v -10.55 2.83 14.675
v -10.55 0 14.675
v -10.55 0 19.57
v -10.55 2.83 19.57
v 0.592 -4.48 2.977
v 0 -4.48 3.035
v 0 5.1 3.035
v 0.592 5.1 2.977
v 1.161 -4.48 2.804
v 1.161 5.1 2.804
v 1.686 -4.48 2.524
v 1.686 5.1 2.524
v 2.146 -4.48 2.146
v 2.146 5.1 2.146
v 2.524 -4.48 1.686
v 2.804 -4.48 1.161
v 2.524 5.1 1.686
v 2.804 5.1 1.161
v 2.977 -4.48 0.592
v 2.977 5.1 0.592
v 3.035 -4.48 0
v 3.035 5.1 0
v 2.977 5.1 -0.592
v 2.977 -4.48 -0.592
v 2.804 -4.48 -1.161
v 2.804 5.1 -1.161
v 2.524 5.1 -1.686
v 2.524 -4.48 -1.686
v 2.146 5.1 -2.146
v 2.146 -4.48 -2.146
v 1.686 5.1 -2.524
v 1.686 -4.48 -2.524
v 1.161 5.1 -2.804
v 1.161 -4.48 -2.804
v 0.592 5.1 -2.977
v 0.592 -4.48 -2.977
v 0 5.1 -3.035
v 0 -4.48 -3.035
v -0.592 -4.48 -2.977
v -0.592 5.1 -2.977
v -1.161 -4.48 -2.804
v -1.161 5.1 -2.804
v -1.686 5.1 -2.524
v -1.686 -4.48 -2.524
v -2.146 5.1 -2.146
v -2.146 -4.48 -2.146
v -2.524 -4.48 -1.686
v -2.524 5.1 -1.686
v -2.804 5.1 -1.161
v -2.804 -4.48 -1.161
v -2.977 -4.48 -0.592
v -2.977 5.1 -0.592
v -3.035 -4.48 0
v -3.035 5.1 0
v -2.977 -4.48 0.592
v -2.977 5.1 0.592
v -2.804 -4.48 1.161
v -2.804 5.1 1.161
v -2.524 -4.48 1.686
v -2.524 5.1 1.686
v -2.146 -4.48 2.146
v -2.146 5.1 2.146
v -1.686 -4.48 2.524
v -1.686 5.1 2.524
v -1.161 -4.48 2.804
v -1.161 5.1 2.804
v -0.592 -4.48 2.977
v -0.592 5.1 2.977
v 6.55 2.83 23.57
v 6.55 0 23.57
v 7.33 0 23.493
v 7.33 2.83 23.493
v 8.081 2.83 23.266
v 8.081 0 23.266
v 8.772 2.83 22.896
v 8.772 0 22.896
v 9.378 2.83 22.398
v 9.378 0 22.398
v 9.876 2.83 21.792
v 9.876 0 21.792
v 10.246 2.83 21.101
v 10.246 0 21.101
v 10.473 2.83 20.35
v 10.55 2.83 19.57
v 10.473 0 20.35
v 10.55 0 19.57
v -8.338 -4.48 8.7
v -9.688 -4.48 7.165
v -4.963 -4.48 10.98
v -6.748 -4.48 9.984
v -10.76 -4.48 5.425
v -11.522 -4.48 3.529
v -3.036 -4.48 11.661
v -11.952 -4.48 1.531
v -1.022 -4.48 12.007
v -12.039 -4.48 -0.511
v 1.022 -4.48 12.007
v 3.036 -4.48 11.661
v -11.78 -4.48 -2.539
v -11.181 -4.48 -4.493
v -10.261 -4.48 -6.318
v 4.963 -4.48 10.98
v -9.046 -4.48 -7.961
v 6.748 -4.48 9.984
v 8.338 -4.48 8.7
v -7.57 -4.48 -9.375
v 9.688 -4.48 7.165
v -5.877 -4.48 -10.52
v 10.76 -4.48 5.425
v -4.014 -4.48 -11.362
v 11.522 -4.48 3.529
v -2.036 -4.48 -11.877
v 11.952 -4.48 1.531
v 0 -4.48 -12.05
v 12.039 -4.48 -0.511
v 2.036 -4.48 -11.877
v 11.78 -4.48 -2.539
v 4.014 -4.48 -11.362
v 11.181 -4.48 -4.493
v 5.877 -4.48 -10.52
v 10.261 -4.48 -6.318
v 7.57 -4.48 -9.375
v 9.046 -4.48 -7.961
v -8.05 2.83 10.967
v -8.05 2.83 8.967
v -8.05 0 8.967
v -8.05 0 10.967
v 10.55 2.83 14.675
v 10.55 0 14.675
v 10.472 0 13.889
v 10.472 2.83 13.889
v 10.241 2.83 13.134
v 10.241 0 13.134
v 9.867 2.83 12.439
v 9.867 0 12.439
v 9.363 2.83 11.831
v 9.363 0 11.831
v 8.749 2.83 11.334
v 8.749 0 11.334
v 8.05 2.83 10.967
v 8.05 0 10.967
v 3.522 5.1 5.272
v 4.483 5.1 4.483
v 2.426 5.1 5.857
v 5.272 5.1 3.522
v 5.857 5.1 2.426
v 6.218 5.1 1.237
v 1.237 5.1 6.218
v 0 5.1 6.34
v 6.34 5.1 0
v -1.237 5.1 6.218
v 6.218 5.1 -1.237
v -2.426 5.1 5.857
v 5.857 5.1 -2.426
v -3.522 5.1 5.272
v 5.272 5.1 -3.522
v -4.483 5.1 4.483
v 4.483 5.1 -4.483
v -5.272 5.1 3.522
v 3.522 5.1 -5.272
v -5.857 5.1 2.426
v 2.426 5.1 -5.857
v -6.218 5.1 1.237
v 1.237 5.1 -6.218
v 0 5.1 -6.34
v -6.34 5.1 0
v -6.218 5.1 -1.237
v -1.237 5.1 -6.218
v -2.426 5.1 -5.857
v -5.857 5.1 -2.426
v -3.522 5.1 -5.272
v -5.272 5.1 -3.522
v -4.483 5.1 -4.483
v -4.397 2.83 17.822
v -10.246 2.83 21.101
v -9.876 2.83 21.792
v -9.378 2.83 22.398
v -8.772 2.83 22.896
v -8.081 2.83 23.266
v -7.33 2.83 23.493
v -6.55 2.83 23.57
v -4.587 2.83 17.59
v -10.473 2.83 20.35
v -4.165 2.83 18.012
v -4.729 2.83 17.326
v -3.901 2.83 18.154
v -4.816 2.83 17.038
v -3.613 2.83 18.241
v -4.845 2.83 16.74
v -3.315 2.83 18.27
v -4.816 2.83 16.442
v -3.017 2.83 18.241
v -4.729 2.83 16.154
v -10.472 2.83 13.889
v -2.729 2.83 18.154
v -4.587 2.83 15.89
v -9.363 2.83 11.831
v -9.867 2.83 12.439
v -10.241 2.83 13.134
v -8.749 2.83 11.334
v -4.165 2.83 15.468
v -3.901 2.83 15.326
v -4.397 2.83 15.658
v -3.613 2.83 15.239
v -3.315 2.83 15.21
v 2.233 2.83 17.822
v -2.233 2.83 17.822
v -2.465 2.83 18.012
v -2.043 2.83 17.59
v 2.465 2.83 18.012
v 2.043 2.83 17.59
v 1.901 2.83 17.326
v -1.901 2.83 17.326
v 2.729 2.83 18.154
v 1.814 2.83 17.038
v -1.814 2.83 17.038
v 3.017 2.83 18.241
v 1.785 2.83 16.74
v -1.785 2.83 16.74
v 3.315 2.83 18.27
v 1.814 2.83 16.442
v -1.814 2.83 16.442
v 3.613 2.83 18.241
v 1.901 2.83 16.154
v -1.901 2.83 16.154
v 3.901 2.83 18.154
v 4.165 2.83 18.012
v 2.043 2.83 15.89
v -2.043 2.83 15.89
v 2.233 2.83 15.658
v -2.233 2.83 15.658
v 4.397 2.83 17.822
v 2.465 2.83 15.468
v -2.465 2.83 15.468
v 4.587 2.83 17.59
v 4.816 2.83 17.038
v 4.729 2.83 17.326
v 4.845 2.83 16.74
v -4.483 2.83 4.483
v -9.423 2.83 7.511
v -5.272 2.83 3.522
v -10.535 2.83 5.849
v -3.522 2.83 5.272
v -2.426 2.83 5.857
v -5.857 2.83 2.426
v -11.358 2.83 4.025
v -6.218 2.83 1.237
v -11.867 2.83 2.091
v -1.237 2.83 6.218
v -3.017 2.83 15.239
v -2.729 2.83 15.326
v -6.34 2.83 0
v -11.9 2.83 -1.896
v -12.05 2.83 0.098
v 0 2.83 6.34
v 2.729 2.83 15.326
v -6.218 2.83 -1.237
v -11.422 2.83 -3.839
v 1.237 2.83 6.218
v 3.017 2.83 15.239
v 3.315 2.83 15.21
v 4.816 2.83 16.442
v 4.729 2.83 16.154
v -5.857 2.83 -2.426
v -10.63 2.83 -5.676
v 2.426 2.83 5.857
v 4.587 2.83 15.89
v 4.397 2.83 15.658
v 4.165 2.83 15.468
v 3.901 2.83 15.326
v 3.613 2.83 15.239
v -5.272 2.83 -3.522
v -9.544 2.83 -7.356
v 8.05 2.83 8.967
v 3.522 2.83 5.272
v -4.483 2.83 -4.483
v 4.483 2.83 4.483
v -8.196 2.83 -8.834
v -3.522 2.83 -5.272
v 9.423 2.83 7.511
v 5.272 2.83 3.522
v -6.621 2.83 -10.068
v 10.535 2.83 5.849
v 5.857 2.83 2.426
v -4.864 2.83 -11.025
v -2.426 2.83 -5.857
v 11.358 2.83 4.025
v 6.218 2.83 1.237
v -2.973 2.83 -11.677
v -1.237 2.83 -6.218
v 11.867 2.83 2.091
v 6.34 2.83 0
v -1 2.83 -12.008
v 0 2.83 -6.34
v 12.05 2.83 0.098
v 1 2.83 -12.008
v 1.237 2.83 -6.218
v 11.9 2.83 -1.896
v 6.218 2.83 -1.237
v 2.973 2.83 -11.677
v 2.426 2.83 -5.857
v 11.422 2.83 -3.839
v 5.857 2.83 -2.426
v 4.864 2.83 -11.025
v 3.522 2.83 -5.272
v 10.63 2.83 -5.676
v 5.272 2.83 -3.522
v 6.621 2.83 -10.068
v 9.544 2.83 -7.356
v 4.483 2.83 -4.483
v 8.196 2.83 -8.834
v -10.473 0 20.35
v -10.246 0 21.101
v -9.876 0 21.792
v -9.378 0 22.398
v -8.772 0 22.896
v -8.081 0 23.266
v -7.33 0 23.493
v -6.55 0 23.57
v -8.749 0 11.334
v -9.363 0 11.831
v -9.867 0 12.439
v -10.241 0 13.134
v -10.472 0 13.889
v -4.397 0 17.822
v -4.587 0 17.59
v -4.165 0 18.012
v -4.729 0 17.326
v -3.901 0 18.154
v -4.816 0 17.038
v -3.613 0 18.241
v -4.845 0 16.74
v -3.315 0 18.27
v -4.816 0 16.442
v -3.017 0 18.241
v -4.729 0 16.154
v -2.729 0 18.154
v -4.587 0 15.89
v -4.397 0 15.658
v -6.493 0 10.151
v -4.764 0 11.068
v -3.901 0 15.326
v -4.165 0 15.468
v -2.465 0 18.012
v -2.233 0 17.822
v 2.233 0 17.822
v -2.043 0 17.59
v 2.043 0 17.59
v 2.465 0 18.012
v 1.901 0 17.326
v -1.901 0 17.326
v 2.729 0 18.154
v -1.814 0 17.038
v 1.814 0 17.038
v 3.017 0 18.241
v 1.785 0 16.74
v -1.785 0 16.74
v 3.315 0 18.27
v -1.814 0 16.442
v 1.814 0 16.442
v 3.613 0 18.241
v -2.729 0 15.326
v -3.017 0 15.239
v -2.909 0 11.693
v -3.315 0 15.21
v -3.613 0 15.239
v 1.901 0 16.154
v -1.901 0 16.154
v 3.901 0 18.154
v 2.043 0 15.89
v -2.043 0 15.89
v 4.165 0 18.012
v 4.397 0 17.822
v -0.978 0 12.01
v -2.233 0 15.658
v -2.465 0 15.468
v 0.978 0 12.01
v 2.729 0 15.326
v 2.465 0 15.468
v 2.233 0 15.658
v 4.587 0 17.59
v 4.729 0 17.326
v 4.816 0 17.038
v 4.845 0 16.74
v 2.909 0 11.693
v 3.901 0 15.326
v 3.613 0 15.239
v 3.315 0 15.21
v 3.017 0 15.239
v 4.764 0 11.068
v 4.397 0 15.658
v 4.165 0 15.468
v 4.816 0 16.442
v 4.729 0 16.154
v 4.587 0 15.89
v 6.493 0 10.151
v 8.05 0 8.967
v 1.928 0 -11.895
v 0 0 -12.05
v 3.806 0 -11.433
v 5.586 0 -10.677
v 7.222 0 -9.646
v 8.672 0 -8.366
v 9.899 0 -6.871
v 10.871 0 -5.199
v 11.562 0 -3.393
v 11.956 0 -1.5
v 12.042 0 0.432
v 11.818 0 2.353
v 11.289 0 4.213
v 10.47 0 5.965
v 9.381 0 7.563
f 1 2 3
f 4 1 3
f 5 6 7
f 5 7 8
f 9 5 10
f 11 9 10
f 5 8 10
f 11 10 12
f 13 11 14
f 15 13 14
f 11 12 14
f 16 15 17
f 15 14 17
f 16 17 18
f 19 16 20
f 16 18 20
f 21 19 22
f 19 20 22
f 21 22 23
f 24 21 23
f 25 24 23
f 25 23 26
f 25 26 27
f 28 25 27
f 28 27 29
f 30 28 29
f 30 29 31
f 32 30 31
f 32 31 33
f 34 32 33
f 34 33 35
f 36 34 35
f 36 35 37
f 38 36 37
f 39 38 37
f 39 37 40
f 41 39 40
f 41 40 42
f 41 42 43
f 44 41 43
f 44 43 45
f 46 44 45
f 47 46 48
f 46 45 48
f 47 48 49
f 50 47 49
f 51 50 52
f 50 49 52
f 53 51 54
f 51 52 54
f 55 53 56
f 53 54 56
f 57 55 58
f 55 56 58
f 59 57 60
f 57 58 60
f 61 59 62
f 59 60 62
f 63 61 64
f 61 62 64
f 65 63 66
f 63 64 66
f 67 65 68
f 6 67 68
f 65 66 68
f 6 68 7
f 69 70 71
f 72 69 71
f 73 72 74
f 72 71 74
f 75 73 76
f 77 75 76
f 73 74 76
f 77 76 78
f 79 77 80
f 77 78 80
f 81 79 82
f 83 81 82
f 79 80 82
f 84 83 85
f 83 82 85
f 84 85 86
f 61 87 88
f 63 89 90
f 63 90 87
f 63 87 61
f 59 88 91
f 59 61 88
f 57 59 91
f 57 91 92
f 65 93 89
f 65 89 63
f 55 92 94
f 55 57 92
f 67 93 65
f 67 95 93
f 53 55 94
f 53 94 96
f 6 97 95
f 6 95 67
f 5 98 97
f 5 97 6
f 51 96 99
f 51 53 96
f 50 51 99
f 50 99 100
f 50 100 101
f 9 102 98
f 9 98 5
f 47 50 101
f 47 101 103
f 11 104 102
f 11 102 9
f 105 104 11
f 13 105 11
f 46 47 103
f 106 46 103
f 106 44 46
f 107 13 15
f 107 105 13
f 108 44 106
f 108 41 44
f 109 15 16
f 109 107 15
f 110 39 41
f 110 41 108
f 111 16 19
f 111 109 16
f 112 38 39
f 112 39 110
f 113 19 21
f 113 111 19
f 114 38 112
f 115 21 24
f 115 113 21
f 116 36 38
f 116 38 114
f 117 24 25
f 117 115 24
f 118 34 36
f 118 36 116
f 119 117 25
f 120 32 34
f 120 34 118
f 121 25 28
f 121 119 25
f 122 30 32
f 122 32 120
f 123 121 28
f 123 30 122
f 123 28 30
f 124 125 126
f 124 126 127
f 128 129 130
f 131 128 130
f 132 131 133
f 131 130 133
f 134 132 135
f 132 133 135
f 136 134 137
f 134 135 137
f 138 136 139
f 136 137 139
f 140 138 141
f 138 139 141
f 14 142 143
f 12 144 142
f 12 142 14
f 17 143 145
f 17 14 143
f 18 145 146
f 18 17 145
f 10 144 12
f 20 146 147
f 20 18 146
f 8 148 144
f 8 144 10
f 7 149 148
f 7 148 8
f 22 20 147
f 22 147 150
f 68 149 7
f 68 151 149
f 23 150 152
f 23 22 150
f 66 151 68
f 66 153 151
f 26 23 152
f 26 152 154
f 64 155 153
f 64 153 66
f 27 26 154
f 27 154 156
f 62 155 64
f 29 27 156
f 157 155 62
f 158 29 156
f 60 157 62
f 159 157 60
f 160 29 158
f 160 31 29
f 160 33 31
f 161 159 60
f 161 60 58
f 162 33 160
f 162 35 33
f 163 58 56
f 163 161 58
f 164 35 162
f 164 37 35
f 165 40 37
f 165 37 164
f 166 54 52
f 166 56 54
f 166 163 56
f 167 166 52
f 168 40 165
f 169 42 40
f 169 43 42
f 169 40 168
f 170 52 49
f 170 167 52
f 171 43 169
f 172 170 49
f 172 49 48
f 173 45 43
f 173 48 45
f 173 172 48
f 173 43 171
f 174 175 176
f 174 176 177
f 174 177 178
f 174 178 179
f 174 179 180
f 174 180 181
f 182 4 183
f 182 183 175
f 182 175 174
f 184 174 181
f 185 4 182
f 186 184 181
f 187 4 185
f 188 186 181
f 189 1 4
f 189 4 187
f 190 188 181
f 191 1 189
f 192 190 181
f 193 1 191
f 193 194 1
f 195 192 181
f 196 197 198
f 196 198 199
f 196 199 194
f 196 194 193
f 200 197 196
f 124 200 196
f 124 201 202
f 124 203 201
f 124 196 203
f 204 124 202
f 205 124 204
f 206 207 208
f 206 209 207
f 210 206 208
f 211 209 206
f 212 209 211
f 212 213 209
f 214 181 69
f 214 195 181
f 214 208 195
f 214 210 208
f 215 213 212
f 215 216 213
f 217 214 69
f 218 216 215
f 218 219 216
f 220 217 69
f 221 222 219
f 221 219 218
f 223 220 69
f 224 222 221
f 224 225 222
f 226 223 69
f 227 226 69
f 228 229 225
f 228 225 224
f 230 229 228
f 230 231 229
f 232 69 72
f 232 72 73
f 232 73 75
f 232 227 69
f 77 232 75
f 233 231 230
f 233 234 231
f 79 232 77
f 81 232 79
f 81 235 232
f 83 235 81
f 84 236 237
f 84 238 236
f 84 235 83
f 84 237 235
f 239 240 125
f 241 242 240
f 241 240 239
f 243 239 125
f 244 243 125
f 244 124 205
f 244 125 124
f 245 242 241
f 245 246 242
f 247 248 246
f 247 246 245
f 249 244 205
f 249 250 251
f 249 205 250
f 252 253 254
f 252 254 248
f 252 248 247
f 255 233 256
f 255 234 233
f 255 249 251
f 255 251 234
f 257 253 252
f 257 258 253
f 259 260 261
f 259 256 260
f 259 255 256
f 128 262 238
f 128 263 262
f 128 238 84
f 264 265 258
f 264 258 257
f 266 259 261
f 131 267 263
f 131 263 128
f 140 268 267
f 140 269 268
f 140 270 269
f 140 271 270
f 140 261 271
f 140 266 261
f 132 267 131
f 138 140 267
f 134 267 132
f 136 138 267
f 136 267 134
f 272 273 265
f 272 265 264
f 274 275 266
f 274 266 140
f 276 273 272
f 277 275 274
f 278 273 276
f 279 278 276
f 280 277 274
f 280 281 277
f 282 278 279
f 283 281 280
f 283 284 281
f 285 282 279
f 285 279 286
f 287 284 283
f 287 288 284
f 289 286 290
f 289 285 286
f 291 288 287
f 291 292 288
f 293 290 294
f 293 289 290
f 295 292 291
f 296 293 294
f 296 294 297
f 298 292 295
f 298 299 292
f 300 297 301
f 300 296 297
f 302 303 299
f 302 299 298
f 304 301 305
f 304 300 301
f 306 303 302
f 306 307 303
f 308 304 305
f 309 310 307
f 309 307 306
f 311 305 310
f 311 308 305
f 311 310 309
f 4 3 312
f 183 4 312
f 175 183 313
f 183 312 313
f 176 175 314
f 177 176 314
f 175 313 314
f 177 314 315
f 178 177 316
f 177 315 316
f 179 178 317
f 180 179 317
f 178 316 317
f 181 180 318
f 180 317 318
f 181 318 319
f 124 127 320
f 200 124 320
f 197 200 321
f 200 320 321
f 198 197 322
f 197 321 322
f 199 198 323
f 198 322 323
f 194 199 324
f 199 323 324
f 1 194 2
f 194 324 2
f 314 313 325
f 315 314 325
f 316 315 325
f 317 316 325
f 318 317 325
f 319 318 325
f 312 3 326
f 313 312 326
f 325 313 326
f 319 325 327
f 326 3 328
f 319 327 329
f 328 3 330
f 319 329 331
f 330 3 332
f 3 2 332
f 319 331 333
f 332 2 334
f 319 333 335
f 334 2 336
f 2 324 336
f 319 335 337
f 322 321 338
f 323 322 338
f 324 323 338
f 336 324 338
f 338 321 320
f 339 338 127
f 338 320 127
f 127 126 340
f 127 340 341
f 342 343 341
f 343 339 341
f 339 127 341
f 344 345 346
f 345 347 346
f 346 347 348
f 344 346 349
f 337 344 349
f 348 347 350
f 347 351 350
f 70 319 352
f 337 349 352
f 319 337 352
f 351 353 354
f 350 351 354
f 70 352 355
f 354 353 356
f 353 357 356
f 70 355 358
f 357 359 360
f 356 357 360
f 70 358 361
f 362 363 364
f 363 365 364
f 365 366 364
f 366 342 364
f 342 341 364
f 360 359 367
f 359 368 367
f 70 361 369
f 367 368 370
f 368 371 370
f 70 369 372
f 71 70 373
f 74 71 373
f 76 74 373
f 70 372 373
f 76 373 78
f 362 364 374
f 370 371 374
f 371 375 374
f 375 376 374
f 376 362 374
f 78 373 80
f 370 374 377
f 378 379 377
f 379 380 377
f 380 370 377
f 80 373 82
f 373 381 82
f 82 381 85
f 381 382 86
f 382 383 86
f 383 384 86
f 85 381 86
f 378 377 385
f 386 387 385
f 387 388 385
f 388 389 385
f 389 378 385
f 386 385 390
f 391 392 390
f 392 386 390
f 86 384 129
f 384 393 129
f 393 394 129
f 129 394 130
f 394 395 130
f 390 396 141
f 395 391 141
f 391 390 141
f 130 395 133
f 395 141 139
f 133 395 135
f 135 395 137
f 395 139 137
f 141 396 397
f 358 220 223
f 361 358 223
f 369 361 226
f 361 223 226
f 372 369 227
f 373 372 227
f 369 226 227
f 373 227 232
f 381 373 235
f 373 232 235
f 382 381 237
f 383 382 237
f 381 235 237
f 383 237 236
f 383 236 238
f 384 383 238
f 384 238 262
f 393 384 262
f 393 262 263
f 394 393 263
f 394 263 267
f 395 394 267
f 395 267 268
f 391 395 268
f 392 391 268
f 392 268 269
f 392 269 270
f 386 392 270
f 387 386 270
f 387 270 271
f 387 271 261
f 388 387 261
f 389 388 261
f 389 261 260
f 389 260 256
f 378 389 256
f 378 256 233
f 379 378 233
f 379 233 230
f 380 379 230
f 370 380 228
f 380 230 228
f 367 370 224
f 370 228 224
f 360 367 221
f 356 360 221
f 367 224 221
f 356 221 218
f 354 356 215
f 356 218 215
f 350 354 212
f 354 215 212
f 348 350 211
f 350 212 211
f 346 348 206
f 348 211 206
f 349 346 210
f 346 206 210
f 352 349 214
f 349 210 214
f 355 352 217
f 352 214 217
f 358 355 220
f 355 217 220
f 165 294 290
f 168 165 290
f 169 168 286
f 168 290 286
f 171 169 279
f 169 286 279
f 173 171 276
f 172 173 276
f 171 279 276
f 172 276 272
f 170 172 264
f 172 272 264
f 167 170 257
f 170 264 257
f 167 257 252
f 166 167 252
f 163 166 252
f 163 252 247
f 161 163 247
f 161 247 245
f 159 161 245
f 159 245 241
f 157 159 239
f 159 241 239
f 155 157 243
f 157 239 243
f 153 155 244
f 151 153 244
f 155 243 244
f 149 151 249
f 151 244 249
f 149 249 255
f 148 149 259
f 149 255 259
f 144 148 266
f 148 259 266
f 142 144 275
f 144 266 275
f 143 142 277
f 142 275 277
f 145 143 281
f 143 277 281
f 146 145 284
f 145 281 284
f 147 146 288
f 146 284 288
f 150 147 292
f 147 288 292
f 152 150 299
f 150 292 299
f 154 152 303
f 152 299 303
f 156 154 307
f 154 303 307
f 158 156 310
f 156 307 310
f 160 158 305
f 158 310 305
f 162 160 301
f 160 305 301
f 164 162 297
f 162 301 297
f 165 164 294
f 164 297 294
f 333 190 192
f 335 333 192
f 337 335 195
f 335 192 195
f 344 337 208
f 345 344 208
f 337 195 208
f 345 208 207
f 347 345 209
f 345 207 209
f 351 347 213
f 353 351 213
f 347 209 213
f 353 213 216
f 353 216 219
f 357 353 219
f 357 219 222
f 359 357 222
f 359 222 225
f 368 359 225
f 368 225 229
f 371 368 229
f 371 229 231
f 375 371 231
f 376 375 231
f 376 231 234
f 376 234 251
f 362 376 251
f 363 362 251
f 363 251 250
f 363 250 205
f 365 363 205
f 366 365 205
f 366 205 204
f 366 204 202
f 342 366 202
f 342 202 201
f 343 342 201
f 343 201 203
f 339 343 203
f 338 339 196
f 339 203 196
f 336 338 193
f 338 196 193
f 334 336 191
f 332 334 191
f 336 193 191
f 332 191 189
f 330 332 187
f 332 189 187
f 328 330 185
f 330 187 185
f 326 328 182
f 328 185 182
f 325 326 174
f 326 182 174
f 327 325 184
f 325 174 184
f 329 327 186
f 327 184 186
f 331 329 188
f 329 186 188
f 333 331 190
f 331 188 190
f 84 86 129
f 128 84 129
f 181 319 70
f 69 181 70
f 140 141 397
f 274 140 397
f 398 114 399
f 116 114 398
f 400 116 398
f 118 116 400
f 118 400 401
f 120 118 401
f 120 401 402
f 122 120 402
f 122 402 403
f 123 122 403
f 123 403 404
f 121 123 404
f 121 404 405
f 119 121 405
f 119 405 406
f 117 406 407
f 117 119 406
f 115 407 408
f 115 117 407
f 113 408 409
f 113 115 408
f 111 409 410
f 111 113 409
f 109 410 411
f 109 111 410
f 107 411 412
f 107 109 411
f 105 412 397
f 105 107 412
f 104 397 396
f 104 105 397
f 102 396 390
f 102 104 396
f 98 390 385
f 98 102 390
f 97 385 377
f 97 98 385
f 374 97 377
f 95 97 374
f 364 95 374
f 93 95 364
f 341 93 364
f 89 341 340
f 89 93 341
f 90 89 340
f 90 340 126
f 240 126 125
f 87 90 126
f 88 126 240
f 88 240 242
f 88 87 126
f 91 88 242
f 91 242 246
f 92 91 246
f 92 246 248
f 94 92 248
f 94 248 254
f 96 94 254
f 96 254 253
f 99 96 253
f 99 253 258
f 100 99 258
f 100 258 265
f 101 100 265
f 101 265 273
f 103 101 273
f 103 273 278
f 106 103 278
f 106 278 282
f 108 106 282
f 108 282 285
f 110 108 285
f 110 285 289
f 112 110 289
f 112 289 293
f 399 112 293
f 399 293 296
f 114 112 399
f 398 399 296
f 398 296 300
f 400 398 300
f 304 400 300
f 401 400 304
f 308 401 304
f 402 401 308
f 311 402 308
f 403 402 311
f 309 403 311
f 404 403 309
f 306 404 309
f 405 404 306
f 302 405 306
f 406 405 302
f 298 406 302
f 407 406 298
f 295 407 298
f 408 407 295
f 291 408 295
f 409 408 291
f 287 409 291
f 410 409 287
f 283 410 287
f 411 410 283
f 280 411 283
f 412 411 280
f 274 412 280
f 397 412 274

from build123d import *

# Parameters (mm, degrees)
BOSS_EXTRUDE1_DEPTH = 2.83
BOSS_EXTRUDE2_START = 4.48
SKETCH2_R           = 12.05
BOSS_EXTRUDE2_DEPTH = 4.48
SKETCH3_R           = 6.34
BOSS_EXTRUDE3_DEPTH = 2.27
SKETCH4_R           = 3.035
CUT_EXTRUDE1_DEPTH  = 29.151799232
SKETCH5_R           = 1.53
CUT_EXTRUDE2_DEPTH  = 28.46240157


with BuildPart() as part:
    # Sketch1 → Boss-Extrude1 (new body)
    with BuildSketch(Plane(origin=(0, 0, 0), x_dir=(1, 0, 0), z_dir=(0, 1, 0))):
        with BuildLine():
            Line((-6.55, -23.57), (6.55, -23.57))
            ThreePointArc((6.55, -23.57), (9.378427125, -22.398427125), (10.55, -19.57))
            Line((10.55, -19.57), (10.55, -14.674703952))
            ThreePointArc((10.55, -14.674703952), (9.86662479, -12.438635975), (8.05, -10.966604709))
            Line((8.05, -10.966604709), (8.05, -8.966604709))
            ThreePointArc((8.05, -8.966604709), (0, 12.05), (-8.05, -8.966604709))
            Line((-8.05, -8.966604709), (-8.05, -10.966604709))
            ThreePointArc((-8.05, -10.966604709), (-9.86662479, -12.438635975), (-10.55, -14.674703952))
            Line((-10.55, -14.674703952), (-10.55, -19.57))
            ThreePointArc((-10.55, -19.57), (-9.378427125, -22.398427125), (-6.55, -23.57))
        make_face()
    extrude(amount=BOSS_EXTRUDE1_DEPTH)

    # Sketch2 → Boss-Extrude2 (add)
    with BuildSketch(Plane.XZ.offset(BOSS_EXTRUDE2_START)):
        with Locations(Location((0, 0, 0), (0, 0, 270))):
            Circle(SKETCH2_R)
    extrude(amount=-BOSS_EXTRUDE2_DEPTH)

    # Sketch3 → Boss-Extrude3 (add)
    with BuildSketch(Plane(origin=(0, 2.83, 0), x_dir=(1, 0, 0), z_dir=(0, 1, 0))):
        with Locations(Location((0, 0, 0), (0, 0, 90))):
            Circle(SKETCH3_R)
    extrude(amount=BOSS_EXTRUDE3_DEPTH)

    # Sketch4 → Cut-Extrude1 (cut, through all)
    with BuildSketch(Plane(origin=(0, 5.1, 0), x_dir=(1, 0, 0), z_dir=(0, 1, 0))):
        with Locations(Location((0, 0, 0), (0, 0, 270))):
            Circle(SKETCH4_R)
    extrude(amount=-CUT_EXTRUDE1_DEPTH, mode=Mode.SUBTRACT)

    # Sketch5 → Cut-Extrude2 (cut, through all)
    with BuildSketch(Plane(origin=(0, 2.83, 0), x_dir=(1, 0, 0), z_dir=(0, 1, 0))):
        with Locations(Location((-3.315, -16.74, 0), (0, 0, 270))):
            Circle(SKETCH5_R)
        with Locations(Location((3.315, -16.74, 0), (0, 0, 270))):
            Circle(SKETCH5_R)
    extrude(amount=-CUT_EXTRUDE2_DEPTH, mode=Mode.SUBTRACT)


solid = part.part
